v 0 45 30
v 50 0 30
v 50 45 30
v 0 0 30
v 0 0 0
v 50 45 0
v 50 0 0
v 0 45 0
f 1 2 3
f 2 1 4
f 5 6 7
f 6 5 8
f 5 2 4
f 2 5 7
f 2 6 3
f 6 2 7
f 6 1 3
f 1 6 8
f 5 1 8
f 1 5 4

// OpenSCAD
difference() {
    translate([-570,-20,0])
        import("ToyREP-Carriage.stl");
    translate([60,40,-5])
        cube([20,20,20]);
    color([1,0,0])
        translate([0,27,5])
            cube([50,7.5,15]);
}

translate([4,0,0]) difference() {
    translate([-570,-20,0])
        import("ToyREP-Carriage.stl");
    translate([-15,-40,-5]) cube([70,200,50]);
}

translate([6,0,0]) difference() {
    translate([-570,-20,0])
        import("ToyREP-Carriage.stl");
    translate([-15,-40,-5]) cube([70,200,50]);
}


!cube([50,45,30]);
